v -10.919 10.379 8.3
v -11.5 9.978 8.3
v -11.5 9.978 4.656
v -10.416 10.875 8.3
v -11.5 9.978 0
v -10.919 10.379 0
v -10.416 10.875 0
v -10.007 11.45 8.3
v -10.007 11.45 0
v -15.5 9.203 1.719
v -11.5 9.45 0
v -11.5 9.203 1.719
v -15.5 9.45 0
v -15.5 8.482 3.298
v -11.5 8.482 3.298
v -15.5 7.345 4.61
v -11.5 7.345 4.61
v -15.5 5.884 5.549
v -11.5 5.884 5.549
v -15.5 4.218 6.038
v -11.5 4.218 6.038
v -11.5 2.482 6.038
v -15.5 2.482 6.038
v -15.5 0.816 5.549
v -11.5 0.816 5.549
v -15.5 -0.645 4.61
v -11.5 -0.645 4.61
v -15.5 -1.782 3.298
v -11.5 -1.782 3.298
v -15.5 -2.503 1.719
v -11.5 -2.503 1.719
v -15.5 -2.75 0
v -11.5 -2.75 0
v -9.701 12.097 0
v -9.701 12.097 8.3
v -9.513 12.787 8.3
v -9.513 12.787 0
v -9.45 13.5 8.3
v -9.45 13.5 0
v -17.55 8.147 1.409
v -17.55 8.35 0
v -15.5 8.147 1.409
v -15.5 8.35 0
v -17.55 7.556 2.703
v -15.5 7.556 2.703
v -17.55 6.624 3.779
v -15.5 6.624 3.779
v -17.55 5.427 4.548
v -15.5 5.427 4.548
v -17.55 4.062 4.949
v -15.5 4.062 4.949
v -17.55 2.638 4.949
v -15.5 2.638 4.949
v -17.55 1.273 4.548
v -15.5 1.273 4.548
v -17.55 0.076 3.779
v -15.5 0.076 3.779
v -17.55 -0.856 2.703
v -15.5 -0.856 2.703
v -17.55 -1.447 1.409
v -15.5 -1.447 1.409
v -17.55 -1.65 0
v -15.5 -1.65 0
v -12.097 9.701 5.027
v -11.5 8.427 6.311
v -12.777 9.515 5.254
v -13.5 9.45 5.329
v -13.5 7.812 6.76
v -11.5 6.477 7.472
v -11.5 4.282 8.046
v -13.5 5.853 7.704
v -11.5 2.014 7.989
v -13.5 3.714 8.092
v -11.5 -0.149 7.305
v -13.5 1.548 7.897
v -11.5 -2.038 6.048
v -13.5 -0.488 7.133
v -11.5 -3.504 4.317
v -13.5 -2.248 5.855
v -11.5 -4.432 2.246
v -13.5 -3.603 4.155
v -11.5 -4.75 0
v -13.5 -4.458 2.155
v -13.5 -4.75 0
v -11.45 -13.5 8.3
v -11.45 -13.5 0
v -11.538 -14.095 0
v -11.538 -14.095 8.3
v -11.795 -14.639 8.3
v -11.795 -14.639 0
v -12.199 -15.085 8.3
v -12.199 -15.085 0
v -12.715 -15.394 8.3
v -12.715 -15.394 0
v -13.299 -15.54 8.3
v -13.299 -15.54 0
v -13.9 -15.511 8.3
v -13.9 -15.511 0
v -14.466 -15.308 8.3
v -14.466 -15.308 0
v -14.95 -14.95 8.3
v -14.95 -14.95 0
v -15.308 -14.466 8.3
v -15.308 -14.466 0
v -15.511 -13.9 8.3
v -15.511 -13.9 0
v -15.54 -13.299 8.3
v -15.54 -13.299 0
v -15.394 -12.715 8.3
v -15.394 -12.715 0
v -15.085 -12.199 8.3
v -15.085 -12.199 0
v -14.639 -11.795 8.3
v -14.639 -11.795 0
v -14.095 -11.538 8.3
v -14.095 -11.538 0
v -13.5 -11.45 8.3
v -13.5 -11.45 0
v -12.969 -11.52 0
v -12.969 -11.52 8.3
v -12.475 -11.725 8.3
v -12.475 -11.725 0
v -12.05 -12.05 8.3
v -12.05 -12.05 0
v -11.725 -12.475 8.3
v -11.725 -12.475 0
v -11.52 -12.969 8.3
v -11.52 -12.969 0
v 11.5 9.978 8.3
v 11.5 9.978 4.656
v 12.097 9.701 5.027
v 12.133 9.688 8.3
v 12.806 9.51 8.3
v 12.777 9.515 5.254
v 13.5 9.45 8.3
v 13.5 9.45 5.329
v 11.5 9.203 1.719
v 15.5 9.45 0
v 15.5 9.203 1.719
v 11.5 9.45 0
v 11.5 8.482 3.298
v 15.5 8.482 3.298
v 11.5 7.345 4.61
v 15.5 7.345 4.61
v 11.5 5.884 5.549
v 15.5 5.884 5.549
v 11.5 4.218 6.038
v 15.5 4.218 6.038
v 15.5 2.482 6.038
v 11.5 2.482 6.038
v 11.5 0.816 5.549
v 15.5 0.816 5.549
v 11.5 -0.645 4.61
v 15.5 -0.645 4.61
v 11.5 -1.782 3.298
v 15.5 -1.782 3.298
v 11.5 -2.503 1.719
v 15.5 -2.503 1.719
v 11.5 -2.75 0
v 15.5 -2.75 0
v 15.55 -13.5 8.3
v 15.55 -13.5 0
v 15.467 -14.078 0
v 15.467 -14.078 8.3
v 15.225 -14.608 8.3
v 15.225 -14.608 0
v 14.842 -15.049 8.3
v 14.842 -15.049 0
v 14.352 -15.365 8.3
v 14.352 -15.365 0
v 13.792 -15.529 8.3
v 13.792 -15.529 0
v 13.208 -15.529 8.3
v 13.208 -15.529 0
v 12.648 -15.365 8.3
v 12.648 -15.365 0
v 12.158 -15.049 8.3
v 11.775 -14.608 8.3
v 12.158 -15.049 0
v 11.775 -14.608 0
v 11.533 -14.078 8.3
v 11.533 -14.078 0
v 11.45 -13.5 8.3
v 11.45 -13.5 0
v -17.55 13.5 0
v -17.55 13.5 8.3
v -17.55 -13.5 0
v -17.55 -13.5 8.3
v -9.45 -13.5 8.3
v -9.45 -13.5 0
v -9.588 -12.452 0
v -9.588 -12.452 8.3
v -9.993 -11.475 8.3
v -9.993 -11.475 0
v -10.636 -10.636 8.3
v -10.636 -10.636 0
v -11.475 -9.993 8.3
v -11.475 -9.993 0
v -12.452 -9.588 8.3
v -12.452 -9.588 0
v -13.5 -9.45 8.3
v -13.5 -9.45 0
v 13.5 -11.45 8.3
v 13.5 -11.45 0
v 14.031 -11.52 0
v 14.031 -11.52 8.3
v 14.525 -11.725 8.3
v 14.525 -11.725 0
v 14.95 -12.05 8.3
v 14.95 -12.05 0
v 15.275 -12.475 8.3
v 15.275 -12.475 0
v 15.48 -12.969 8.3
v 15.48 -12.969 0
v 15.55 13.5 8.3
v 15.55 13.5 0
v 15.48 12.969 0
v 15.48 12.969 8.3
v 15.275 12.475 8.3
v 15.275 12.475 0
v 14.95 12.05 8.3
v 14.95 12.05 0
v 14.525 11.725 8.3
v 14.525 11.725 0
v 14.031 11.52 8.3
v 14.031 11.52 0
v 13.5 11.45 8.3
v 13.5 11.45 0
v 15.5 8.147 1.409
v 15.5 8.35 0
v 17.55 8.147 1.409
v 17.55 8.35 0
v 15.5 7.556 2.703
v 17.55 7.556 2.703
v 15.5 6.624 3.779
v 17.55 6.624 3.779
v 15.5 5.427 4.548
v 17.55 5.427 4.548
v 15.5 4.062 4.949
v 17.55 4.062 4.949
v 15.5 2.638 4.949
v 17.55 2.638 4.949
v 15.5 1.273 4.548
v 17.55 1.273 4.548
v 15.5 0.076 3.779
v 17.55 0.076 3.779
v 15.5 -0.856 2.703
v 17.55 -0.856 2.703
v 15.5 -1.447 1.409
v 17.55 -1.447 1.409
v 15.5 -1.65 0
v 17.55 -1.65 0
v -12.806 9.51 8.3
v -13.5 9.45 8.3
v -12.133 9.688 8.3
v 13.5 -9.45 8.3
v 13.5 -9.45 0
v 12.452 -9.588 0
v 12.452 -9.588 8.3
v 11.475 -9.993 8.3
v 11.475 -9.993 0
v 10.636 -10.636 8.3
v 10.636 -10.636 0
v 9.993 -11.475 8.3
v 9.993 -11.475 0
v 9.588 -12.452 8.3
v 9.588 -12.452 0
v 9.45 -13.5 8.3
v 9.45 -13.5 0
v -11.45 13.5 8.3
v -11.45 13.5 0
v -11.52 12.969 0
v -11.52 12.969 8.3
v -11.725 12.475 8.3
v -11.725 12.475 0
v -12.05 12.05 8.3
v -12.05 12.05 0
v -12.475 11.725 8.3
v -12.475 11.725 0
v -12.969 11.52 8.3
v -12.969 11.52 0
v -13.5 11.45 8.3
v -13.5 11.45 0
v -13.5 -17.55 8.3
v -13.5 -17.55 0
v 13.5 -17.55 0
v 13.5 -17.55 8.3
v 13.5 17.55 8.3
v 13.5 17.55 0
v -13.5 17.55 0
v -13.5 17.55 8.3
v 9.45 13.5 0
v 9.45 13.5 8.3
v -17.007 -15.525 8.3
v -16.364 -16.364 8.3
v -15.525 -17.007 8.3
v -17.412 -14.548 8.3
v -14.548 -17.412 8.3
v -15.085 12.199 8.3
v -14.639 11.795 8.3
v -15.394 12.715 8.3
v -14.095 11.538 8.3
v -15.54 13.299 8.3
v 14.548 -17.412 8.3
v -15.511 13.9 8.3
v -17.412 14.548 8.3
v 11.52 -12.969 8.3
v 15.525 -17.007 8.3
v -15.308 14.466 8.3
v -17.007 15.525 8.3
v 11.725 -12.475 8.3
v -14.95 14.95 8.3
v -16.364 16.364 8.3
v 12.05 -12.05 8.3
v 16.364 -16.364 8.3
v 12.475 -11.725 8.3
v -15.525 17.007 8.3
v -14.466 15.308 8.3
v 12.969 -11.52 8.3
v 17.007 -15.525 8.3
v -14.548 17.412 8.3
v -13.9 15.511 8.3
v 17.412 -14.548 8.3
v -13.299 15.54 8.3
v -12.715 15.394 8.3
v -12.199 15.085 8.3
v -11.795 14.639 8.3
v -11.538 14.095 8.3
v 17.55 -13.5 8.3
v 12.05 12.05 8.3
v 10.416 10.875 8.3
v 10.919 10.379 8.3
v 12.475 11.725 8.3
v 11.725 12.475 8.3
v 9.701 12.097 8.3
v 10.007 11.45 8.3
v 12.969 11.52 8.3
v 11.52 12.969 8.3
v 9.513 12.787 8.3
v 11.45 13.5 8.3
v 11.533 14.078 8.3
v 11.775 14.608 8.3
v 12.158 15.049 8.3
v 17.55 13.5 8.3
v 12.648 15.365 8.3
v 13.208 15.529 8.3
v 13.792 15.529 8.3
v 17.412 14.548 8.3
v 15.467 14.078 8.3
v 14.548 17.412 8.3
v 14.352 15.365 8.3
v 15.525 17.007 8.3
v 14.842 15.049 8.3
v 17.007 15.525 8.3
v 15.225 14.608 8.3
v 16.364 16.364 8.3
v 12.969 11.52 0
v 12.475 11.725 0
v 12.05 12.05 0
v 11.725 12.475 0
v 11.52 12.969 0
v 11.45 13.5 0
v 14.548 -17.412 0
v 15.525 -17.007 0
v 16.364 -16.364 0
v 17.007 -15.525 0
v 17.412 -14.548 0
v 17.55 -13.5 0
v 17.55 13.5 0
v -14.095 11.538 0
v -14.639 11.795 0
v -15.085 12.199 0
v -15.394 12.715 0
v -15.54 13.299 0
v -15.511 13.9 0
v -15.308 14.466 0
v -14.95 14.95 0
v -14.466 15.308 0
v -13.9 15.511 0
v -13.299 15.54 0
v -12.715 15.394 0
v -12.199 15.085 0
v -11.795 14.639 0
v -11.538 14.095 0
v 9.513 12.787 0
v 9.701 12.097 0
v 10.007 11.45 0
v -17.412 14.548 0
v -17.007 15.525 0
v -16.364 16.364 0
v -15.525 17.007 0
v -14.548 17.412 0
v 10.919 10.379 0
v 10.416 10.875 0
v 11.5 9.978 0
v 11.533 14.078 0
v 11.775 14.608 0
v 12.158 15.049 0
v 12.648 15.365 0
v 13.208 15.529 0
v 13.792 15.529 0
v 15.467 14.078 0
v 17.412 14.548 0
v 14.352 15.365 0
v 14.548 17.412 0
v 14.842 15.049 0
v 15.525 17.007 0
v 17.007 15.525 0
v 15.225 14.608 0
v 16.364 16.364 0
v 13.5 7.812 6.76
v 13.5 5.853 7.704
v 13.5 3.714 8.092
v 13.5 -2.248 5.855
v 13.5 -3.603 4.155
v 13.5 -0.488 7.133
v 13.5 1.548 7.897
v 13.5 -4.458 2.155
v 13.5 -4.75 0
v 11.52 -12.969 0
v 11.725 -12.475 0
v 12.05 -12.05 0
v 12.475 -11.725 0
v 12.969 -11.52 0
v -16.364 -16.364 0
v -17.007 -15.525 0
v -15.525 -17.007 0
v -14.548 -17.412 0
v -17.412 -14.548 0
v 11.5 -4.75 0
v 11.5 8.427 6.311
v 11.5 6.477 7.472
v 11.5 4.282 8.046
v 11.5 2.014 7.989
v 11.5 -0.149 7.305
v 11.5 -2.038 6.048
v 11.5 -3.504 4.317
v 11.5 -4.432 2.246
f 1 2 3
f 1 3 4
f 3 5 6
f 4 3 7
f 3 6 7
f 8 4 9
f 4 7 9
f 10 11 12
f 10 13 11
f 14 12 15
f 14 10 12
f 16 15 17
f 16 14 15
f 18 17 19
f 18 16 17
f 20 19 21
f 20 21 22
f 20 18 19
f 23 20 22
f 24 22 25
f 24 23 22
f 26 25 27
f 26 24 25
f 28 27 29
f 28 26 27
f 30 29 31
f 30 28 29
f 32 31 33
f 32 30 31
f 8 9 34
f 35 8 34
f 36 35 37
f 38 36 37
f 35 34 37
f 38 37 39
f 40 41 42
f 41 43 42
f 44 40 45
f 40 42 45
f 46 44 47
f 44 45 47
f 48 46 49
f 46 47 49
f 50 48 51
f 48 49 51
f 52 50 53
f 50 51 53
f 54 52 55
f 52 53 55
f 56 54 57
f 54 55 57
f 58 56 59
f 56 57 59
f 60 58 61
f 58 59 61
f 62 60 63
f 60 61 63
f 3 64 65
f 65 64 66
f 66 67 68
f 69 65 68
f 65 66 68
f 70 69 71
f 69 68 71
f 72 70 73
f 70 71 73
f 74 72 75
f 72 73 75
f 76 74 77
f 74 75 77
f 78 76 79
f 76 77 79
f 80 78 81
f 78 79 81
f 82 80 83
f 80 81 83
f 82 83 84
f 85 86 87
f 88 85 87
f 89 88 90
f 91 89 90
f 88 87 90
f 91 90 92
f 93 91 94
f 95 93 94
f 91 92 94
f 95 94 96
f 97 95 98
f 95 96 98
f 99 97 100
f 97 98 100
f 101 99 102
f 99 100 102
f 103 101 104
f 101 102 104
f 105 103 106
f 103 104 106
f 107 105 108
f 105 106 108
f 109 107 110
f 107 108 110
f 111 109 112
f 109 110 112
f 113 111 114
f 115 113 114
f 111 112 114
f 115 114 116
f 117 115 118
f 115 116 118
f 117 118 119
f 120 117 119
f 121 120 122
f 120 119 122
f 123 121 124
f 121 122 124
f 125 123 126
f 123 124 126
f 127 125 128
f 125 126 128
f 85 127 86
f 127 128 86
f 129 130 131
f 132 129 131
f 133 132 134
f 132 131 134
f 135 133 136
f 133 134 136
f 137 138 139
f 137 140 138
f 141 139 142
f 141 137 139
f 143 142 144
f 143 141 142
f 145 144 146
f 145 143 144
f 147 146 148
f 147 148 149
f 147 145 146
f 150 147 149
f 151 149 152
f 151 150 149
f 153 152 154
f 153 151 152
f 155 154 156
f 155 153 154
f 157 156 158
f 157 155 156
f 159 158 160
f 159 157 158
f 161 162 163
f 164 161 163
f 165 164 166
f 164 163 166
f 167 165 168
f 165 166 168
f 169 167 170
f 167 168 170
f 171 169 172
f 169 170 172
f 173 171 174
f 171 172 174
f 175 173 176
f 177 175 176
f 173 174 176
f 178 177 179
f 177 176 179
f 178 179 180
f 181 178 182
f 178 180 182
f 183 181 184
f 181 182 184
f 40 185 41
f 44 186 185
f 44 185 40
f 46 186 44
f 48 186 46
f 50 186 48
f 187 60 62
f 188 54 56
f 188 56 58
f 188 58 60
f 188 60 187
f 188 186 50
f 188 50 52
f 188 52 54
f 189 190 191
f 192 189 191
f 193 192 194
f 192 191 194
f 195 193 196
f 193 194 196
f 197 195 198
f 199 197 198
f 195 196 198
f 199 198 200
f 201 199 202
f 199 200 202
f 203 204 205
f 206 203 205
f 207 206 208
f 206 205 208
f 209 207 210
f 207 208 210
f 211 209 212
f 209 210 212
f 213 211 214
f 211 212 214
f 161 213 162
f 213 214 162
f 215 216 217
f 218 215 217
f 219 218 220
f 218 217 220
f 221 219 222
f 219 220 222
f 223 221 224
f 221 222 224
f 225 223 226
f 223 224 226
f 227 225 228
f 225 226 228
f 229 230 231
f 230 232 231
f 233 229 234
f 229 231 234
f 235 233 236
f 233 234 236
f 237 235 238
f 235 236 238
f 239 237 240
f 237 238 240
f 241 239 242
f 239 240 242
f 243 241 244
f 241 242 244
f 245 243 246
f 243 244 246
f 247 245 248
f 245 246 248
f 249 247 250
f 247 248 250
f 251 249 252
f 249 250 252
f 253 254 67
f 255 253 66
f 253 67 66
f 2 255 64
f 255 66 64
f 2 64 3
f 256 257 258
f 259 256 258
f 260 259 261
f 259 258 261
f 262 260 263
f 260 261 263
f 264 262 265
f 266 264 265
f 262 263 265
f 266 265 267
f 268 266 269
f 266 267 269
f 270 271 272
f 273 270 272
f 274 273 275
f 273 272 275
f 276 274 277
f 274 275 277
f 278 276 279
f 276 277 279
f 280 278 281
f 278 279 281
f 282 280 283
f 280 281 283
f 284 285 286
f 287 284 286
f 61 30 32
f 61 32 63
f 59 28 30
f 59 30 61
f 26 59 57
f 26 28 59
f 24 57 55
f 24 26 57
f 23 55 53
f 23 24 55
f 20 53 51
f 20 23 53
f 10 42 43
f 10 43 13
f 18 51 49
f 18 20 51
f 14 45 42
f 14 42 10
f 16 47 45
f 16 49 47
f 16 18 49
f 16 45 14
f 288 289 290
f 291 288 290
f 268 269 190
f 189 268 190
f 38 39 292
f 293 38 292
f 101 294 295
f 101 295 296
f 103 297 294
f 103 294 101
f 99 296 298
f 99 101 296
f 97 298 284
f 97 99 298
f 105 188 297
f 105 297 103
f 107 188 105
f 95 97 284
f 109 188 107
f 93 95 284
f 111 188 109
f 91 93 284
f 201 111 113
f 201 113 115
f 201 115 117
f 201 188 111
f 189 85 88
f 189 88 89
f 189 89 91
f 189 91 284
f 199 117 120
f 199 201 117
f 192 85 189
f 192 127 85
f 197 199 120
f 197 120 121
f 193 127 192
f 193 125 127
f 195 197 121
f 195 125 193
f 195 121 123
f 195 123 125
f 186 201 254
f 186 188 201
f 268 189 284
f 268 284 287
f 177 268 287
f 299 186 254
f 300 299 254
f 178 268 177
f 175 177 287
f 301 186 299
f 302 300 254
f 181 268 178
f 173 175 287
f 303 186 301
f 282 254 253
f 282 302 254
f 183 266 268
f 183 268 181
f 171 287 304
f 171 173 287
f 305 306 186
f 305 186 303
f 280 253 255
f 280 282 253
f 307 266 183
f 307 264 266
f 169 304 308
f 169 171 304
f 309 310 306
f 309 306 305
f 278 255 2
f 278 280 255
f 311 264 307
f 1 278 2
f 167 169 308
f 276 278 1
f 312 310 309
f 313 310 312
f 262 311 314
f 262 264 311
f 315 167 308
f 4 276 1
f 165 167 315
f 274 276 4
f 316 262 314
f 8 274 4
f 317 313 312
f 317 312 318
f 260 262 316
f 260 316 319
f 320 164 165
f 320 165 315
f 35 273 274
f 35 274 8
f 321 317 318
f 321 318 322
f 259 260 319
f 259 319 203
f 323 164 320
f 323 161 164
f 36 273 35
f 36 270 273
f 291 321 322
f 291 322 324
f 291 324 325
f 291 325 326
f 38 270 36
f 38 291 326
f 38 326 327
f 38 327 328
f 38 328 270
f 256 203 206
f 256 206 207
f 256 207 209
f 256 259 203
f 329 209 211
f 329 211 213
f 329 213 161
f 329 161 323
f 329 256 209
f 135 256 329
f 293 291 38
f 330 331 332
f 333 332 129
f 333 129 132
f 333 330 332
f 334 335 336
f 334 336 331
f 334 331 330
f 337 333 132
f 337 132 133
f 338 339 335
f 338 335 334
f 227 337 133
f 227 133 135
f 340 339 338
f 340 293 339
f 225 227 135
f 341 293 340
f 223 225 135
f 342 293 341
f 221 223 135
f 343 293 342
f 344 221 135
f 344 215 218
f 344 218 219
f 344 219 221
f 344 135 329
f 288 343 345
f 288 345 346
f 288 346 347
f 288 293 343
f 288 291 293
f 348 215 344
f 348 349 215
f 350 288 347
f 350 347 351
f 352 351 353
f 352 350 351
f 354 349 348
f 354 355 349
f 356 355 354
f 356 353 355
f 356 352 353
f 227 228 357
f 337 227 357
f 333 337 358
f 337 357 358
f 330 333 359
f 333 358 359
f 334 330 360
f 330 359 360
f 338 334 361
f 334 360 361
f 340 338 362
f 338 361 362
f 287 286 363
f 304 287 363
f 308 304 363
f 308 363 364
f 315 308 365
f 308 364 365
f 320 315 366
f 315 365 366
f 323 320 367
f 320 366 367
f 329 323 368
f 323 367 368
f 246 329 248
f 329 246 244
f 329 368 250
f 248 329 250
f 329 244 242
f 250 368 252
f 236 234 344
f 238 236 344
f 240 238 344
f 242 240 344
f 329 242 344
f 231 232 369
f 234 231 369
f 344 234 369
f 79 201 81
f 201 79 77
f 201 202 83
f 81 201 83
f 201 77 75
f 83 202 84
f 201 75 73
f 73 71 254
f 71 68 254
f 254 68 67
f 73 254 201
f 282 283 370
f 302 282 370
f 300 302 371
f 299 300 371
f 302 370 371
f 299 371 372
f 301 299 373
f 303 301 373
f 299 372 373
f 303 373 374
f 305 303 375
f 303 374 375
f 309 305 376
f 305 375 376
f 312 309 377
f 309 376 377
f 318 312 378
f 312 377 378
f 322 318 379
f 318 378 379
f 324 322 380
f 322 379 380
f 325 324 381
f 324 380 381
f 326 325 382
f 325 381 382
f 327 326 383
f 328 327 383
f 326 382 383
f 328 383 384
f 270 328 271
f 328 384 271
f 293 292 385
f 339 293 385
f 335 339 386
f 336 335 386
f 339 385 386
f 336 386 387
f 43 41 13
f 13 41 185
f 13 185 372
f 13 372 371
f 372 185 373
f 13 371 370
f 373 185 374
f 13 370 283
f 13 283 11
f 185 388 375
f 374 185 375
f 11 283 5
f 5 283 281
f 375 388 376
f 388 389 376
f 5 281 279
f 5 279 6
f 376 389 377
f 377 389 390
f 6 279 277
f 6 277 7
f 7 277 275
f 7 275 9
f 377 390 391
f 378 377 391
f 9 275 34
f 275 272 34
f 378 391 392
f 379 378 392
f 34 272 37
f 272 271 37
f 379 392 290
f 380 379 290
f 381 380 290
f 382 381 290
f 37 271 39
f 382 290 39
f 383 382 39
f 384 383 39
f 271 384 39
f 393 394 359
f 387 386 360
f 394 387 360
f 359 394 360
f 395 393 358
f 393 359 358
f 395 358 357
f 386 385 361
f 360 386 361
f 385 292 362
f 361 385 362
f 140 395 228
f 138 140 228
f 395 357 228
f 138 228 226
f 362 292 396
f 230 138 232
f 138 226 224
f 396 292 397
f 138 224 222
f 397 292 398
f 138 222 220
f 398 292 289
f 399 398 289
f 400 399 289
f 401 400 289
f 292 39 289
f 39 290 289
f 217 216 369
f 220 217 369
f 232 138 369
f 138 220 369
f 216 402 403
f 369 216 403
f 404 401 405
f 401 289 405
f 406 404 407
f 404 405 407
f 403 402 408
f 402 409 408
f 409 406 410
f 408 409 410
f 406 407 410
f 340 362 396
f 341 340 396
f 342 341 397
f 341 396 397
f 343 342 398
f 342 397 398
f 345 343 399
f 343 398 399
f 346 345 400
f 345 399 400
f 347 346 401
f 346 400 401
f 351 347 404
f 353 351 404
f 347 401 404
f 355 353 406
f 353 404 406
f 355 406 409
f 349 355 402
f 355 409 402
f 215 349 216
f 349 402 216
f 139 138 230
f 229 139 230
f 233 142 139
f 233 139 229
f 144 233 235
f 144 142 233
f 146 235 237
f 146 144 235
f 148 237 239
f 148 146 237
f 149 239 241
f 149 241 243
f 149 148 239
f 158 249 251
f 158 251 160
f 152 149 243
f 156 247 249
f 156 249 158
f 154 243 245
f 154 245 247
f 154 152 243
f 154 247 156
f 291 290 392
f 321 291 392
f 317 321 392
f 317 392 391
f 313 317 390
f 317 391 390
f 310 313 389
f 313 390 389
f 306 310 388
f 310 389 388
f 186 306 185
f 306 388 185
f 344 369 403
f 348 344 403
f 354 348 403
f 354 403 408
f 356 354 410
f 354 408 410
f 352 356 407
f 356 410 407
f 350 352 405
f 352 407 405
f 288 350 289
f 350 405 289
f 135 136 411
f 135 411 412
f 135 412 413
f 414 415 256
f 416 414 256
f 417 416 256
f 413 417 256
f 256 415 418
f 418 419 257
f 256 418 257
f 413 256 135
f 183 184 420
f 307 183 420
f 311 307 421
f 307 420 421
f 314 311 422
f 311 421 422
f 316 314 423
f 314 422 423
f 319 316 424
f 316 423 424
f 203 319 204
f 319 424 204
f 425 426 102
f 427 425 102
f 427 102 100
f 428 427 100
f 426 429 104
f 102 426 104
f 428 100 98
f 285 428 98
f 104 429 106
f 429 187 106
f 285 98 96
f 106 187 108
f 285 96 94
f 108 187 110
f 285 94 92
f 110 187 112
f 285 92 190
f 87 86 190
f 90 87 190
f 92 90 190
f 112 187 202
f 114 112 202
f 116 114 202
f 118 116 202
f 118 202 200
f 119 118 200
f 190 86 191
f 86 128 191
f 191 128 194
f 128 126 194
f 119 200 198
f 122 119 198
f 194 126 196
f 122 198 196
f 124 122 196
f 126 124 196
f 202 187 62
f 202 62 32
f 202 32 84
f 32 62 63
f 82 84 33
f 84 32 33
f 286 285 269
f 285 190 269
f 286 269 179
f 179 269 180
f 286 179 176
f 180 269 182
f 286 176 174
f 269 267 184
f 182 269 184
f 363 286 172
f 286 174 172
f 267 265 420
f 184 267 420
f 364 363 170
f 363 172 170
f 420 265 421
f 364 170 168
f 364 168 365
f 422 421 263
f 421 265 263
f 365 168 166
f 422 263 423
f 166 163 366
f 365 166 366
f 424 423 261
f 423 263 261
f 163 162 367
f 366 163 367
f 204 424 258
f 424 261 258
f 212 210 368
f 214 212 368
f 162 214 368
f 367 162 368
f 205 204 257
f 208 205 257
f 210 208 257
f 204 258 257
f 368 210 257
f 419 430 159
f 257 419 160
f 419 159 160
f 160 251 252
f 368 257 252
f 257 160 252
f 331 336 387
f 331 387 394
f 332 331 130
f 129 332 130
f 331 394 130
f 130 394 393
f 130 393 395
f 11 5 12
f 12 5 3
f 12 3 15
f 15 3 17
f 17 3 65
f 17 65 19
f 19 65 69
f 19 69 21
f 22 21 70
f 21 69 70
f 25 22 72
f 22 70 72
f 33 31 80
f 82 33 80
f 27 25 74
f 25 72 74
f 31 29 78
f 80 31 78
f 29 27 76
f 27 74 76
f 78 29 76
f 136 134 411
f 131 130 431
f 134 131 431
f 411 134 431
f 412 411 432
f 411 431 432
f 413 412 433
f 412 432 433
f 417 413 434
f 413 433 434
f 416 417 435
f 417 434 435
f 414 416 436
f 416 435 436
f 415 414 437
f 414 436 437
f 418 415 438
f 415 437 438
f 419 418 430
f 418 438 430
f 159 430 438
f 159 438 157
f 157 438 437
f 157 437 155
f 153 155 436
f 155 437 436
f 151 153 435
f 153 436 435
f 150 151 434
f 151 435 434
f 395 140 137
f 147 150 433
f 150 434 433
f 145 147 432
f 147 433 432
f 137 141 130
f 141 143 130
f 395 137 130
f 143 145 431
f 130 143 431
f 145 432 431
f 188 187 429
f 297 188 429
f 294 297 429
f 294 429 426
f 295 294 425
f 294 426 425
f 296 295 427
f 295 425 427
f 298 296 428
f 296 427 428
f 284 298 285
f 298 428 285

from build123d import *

# Parameters (mm, degrees)
F0_W     = 2
F0_H     = 6.1
F0_H_2   = 2
F0_W_2   = 2.05
F0_H_3   = 5
F1_DEPTH = 8.3
F2_ANGLE = 180
F3_ANGLE = 180


with BuildPart() as f1:
    # F0 (on Top) → F1 (new body)
    with BuildSketch(Plane.XY):
        with BuildLine():
            ThreePointArc((-13.5, 9.45), (-14.5342970466, 9.5842970466), (-15.5, 9.9782816694))
            Line((-15.5, 9.9782816694), (-15.5, 9.45))
            Line((-15.5, 9.45), (-13.5, 9.45))
        make_face()
        with BuildLine():
            ThreePointArc((-9.45, 13.5), (-10.6362175362, 16.3637824638), (-13.5, 17.55))
            ThreePointArc((-13.5, 17.55), (-16.3637824638, 16.3637824638), (-17.55, 13.5))
            ThreePointArc((-17.55, 13.5), (-17.0001785669, 11.4625383439), (-15.5, 9.9782816694))
            Line((-15.5, 9.9782816694), (-15.5, 11.45))
            Line((-15.5, 11.45), (-13.5, 11.45))
            ThreePointArc((-13.5, 11.45), (-14.9495689014, 14.9495689014), (-11.45, 13.5))
            Line((-11.45, 13.5), (-9.45, 13.5))
        make_face()
        with BuildLine():
            Line((-15.5, 11.45), (-15.5, 9.9782816694))
            ThreePointArc((-15.5, 9.9782816694), (-14.5342970466, 9.5842970466), (-13.5, 9.45))
            Line((-13.5, 9.45), (-13.5, 11.45))
            Line((-13.5, 11.45), (-15.5, 11.45))
        make_face()
        with BuildLine():
            ThreePointArc((-15.5, 9.9782816694), (-17.0001785669, 11.4625383439), (-17.55, 13.5))
            Line((-17.55, 13.5), (-17.55, 8.35))
            Line((-17.55, 8.35), (-15.5, 8.35))
            Line((-15.5, 8.35), (-15.5, 9.45))
            Line((-15.5, 9.45), (-15.5, 9.9782816694))
        make_face()
        with Locations((-14.5, 0.3)):
            Rectangle(F0_W, F0_H)
        with Locations((-14.5, -3.75)):
            Rectangle(F0_W, F0_H_2)
        with BuildLine():
            ThreePointArc((-13.5, -9.45), (-16.3637824638, -10.6362175362), (-17.55, -13.5))
            ThreePointArc((-17.55, -13.5), (-16.3637824638, -16.3637824638), (-13.5, -17.55))
            ThreePointArc((-13.5, -17.55), (-10.6362175362, -16.3637824638), (-9.45, -13.5))
            Line((-9.45, -13.5), (-11.45, -13.5))
            ThreePointArc((-11.45, -13.5), (-14.9495689014, -14.9495689014), (-13.5, -11.45))
            Line((-13.5, -11.45), (-13.5, -9.45))
        make_face()
        with BuildLine():
            Line((-13.5, -17.55), (13.5, -17.55))
            ThreePointArc((13.5, -17.55), (10.6362175362, -16.3637824638), (9.45, -13.5))
            Line((9.45, -13.5), (-9.45, -13.5))
            ThreePointArc((-9.45, -13.5), (-10.6362175362, -16.3637824638), (-13.5, -17.55))
        make_face()
        with BuildLine():
            ThreePointArc((-9.45, -13.5), (-10.6362175362, -10.6362175362), (-13.5, -9.45))
            Line((-13.5, -9.45), (-13.5, -11.45))
            ThreePointArc((-13.5, -11.45), (-12.0504310986, -12.0504310986), (-11.45, -13.5))
            Line((-11.45, -13.5), (-9.45, -13.5))
        make_face()
        with BuildLine():
            ThreePointArc((13.5, -17.55), (16.3637824638, -16.3637824638), (17.55, -13.5))
            ThreePointArc((17.55, -13.5), (16.3637824638, -10.6362175362), (13.5, -9.45))
            Line((13.5, -9.45), (13.5, -11.45))
            ThreePointArc((13.5, -11.45), (14.9495689014, -12.0504310986), (15.55, -13.5))
            ThreePointArc((15.55, -13.5), (13.5, -15.55), (11.45, -13.5))
            Line((11.45, -13.5), (9.45, -13.5))
            ThreePointArc((9.45, -13.5), (10.6362175362, -16.3637824638), (13.5, -17.55))
        make_face()
        with BuildLine():
            Line((13.5, -11.45), (13.5, -9.45))
            ThreePointArc((13.5, -9.45), (10.6362175362, -10.6362175362), (9.45, -13.5))
            Line((9.45, -13.5), (11.45, -13.5))
            ThreePointArc((11.45, -13.5), (12.0504310986, -12.0504310986), (13.5, -11.45))
        make_face()
        with BuildLine():
            Line((17.55, 8.35), (17.55, 13.5))
            ThreePointArc((17.55, 13.5), (17.0001785669, 11.4625383439), (15.5, 9.9782816694))
            Line((15.5, 9.9782816694), (15.5, 9.45))
            Line((15.5, 9.45), (15.5, 8.35))
            Line((15.5, 8.35), (17.55, 8.35))
        make_face()
        with Locations((14.5, -3.75)):
            Rectangle(F0_W, F0_H_2)
        with Locations((14.5, 0.3)):
            Rectangle(F0_W, F0_H)
        with BuildLine():
            Line((15.5, 9.45), (15.5, 9.9782816694))
            ThreePointArc((15.5, 9.9782816694), (14.5342970466, 9.5842970466), (13.5, 9.45))
            Line((13.5, 9.45), (15.5, 9.45))
        make_face()
        with BuildLine():
            ThreePointArc((13.5, 9.45), (14.5342970466, 9.5842970466), (15.5, 9.9782816694))
            Line((15.5, 9.9782816694), (15.5, 11.45))
            Line((15.5, 11.45), (13.5, 11.45))
            Line((13.5, 11.45), (13.5, 9.45))
        make_face()
        with BuildLine():
            ThreePointArc((11.5, 9.9782816694), (12.4657029534, 9.5842970466), (13.5, 9.45))
            Line((13.5, 9.45), (13.5, 11.45))
            Line((13.5, 11.45), (11.5, 11.45))
            Line((11.5, 11.45), (11.5, 9.9782816694))
        make_face()
        with BuildLine():
            Line((11.5, 11.45), (10.0071501607, 11.45))
            ThreePointArc((10.0071501607, 11.45), (10.6567028733, 10.6158776986), (11.5, 9.9782816694))
            Line((11.5, 9.9782816694), (11.5, 11.45))
        make_face()
        with BuildLine():
            Line((11.45, 13.5), (9.45, 13.5))
            ThreePointArc((9.45, 13.5), (9.5917688241, 12.4378187182), (10.0071501607, 11.45))
            Line((10.0071501607, 11.45), (11.5, 11.45))
            Line((11.5, 11.45), (13.5, 11.45))
            ThreePointArc((13.5, 11.45), (12.0504310986, 12.0504310986), (11.45, 13.5))
        make_face()
        with BuildLine():
            ThreePointArc((17.55, 13.5), (16.3637824638, 16.3637824638), (13.5, 17.55))
            ThreePointArc((13.5, 17.55), (10.6362175362, 16.3637824638), (9.45, 13.5))
            Line((9.45, 13.5), (11.45, 13.5))
            ThreePointArc((11.45, 13.5), (13.5, 15.55), (15.55, 13.5))
            ThreePointArc((15.55, 13.5), (14.9495689014, 12.0504310986), (13.5, 11.45))
            Line((13.5, 11.45), (15.5, 11.45))
            Line((15.5, 11.45), (15.5, 9.9782816694))
            ThreePointArc((15.5, 9.9782816694), (17.0001785669, 11.4625383439), (17.55, 13.5))
        make_face()
        with BuildLine():
            ThreePointArc((9.45, 13.5), (10.6362175362, 16.3637824638), (13.5, 17.55))
            Line((13.5, 17.55), (-13.5, 17.55))
            ThreePointArc((-13.5, 17.55), (-10.6362175362, 16.3637824638), (-9.45, 13.5))
            Line((-9.45, 13.5), (9.45, 13.5))
        make_face()
        with BuildLine():
            ThreePointArc((-10.0071501607, 11.45), (-9.5917688241, 12.4378187182), (-9.45, 13.5))
            Line((-9.45, 13.5), (-11.45, 13.5))
            ThreePointArc((-11.45, 13.5), (-12.0504310986, 12.0504310986), (-13.5, 11.45))
            Line((-13.5, 11.45), (-11.5, 11.45))
            Line((-11.5, 11.45), (-10.0071501607, 11.45))
        make_face()
        with BuildLine():
            Line((-11.5, 11.45), (-13.5, 11.45))
            Line((-13.5, 11.45), (-13.5, 9.45))
            ThreePointArc((-13.5, 9.45), (-12.4657029534, 9.5842970466), (-11.5, 9.9782816694))
            Line((-11.5, 9.9782816694), (-11.5, 11.45))
        make_face()
        with BuildLine():
            ThreePointArc((-11.5, 9.9782816694), (-10.6567028733, 10.6158776986), (-10.0071501607, 11.45))
            Line((-10.0071501607, 11.45), (-11.5, 11.45))
            Line((-11.5, 11.45), (-11.5, 9.9782816694))
        make_face()
        with BuildLine():
            Line((-15.5, 3.35), (-17.55, 3.35))
            Line((-17.55, 3.35), (-17.55, -13.5))
            ThreePointArc((-17.55, -13.5), (-16.3637824638, -10.6362175362), (-13.5, -9.45))
            Line((-13.5, -9.45), (-13.5, -4.75))
            Line((-13.5, -4.75), (-15.5, -4.75))
            Line((-15.5, -4.75), (-15.5, -2.75))
            Line((-15.5, -2.75), (-15.5, 3.35))
        make_face()
        with Locations((-16.525, 5.85)):
            Rectangle(F0_W_2, F0_H_3)
        Polygon((-15.5, 9.45), (-15.5, 8.35), (-15.5, 3.35), (-13.5, 3.35), (-13.5, 9.45), align=None)
        with Locations((16.525, 5.85)):
            Rectangle(F0_W_2, F0_H_3)
        Polygon((15.5, 3.35), (15.5, 8.35), (15.5, 9.45), (13.5, 9.45), (13.5, 3.35), align=None)
        with BuildLine():
            Line((17.55, -13.5), (17.55, 3.35))
            Line((17.55, 3.35), (15.5, 3.35))
            Line((15.5, 3.35), (15.5, -2.75))
            Line((15.5, -2.75), (15.5, -4.75))
            Line((15.5, -4.75), (13.5, -4.75))
            Line((13.5, -4.75), (13.5, -9.45))
            ThreePointArc((13.5, -9.45), (16.3637824638, -10.6362175362), (17.55, -13.5))
        make_face()
    extrude(amount=F1_DEPTH)

    # F0 (on Top) → F2 (revolve)
    with BuildSketch(Plane.XY):
        with Locations((-16.525, 5.85)):
            Rectangle(F0_W_2, F0_H_3)
        Polygon((-15.5, 9.45), (-15.5, 8.35), (-15.5, 3.35), (-13.5, 3.35), (-13.5, 9.45), align=None)
        with Locations((-12.5, 6.4)):
            Rectangle(F0_W, F0_H)
        with BuildLine():
            Line((-11.5, 11.45), (-13.5, 11.45))
            Line((-13.5, 11.45), (-13.5, 9.45))
            ThreePointArc((-13.5, 9.45), (-12.4657029534, 9.5842970466), (-11.5, 9.9782816694))
            Line((-11.5, 9.9782816694), (-11.5, 11.45))
        make_face()
        with BuildLine():
            Line((-15.5, 11.45), (-15.5, 9.9782816694))
            ThreePointArc((-15.5, 9.9782816694), (-14.5342970466, 9.5842970466), (-13.5, 9.45))
            Line((-13.5, 9.45), (-13.5, 11.45))
            Line((-13.5, 11.45), (-15.5, 11.45))
        make_face()
        with BuildLine():
            ThreePointArc((11.5, 9.9782816694), (12.4657029534, 9.5842970466), (13.5, 9.45))
            Line((13.5, 9.45), (13.5, 11.45))
            Line((13.5, 11.45), (11.5, 11.45))
            Line((11.5, 11.45), (11.5, 9.9782816694))
        make_face()
        with Locations((12.5, 6.4)):
            Rectangle(F0_W, F0_H)
        with BuildLine():
            ThreePointArc((13.5, 9.45), (14.5342970466, 9.5842970466), (15.5, 9.9782816694))
            Line((15.5, 9.9782816694), (15.5, 11.45))
            Line((15.5, 11.45), (13.5, 11.45))
            Line((13.5, 11.45), (13.5, 9.45))
        make_face()
        with BuildLine():
            Line((-11.5, 9.45), (-11.5, 9.9782816694))
            ThreePointArc((-11.5, 9.9782816694), (-12.4657029534, 9.5842970466), (-13.5, 9.45))
            Line((-13.5, 9.45), (-11.5, 9.45))
        make_face()
        with BuildLine():
            ThreePointArc((-13.5, 9.45), (-14.5342970466, 9.5842970466), (-15.5, 9.9782816694))
            Line((-15.5, 9.9782816694), (-15.5, 9.45))
            Line((-15.5, 9.45), (-13.5, 9.45))
        make_face()
        with BuildLine():
            Line((15.5, 9.45), (15.5, 9.9782816694))
            ThreePointArc((15.5, 9.9782816694), (14.5342970466, 9.5842970466), (13.5, 9.45))
            Line((13.5, 9.45), (15.5, 9.45))
        make_face()
        with BuildLine():
            Line((11.5, 9.45), (13.5, 9.45))
            ThreePointArc((13.5, 9.45), (12.4657029534, 9.5842970466), (11.5, 9.9782816694))
            Line((11.5, 9.9782816694), (11.5, 9.45))
        make_face()
        with Locations((16.525, 5.85)):
            Rectangle(F0_W_2, F0_H_3)
        Polygon((15.5, 3.35), (15.5, 8.35), (15.5, 9.45), (13.5, 9.45), (13.5, 3.35), align=None)
    revolve(axis=Axis((0, 3.35, 0), (1, 0, 0)), revolution_arc=F2_ANGLE)

    # F0 (on Top) → F3 (revolve, cut)
    with BuildSketch(Plane.XY):
        Polygon((15.5, 3.35), (15.5, 8.35), (15.5, 9.45), (13.5, 9.45), (13.5, 3.35), align=None)
        with Locations((16.525, 5.85)):
            Rectangle(F0_W_2, F0_H_3)
        with Locations((12.5, 6.4)):
            Rectangle(F0_W, F0_H)
        with Locations((-12.5, 6.4)):
            Rectangle(F0_W, F0_H)
        Polygon((-15.5, 9.45), (-15.5, 8.35), (-15.5, 3.35), (-13.5, 3.35), (-13.5, 9.45), align=None)
        with Locations((-16.525, 5.85)):
            Rectangle(F0_W_2, F0_H_3)
    revolve(axis=Axis((0, 3.35, 0), (1, 0, 0)), revolution_arc=F3_ANGLE, mode=Mode.SUBTRACT)


solid = f1.part
